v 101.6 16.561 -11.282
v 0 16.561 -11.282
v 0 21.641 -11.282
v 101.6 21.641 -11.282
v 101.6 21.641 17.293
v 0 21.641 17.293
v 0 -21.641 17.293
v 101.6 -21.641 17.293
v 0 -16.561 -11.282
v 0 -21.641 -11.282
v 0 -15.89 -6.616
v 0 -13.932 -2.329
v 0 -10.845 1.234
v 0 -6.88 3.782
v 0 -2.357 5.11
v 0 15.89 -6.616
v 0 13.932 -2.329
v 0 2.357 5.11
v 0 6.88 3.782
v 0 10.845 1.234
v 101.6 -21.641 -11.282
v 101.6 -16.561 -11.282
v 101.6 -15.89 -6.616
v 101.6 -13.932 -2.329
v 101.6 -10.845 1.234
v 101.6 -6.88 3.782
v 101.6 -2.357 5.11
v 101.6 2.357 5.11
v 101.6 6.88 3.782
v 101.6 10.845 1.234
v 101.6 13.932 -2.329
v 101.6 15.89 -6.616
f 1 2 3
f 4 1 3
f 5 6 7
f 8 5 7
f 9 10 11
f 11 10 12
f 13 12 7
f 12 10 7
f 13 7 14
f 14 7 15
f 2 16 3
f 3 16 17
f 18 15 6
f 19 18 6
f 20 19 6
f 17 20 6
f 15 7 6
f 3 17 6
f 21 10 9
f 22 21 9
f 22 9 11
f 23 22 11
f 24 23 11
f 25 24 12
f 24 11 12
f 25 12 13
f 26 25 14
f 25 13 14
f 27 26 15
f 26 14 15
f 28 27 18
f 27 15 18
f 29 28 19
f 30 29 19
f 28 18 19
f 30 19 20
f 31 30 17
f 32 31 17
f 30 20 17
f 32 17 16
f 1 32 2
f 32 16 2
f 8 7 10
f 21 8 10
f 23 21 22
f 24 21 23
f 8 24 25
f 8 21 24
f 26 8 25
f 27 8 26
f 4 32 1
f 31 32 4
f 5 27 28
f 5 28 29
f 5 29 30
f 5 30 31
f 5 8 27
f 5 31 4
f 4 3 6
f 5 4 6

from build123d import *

# Parameters (mm, degrees)
F1_DEPTH = 101.6


with BuildPart() as f1:
    # F0 (on Right) → F1 (new body)
    with BuildSketch(Plane.YZ):
        with BuildLine():
            ThreePointArc((-16.5608, -11.282155), (0, 5.278645), (16.5608, -11.282155))
            Line((16.5608, -11.282155), (21.6408, -11.282155))
            Line((21.6408, -11.282155), (21.6408, 17.292845))
            Line((21.6408, 17.292845), (-21.6408, 17.292845))
            Line((-21.6408, 17.292845), (-21.6408, -11.282155))
            Line((-21.6408, -11.282155), (-16.5608, -11.282155))
        make_face()
    extrude(amount=F1_DEPTH)


solid = f1.part
